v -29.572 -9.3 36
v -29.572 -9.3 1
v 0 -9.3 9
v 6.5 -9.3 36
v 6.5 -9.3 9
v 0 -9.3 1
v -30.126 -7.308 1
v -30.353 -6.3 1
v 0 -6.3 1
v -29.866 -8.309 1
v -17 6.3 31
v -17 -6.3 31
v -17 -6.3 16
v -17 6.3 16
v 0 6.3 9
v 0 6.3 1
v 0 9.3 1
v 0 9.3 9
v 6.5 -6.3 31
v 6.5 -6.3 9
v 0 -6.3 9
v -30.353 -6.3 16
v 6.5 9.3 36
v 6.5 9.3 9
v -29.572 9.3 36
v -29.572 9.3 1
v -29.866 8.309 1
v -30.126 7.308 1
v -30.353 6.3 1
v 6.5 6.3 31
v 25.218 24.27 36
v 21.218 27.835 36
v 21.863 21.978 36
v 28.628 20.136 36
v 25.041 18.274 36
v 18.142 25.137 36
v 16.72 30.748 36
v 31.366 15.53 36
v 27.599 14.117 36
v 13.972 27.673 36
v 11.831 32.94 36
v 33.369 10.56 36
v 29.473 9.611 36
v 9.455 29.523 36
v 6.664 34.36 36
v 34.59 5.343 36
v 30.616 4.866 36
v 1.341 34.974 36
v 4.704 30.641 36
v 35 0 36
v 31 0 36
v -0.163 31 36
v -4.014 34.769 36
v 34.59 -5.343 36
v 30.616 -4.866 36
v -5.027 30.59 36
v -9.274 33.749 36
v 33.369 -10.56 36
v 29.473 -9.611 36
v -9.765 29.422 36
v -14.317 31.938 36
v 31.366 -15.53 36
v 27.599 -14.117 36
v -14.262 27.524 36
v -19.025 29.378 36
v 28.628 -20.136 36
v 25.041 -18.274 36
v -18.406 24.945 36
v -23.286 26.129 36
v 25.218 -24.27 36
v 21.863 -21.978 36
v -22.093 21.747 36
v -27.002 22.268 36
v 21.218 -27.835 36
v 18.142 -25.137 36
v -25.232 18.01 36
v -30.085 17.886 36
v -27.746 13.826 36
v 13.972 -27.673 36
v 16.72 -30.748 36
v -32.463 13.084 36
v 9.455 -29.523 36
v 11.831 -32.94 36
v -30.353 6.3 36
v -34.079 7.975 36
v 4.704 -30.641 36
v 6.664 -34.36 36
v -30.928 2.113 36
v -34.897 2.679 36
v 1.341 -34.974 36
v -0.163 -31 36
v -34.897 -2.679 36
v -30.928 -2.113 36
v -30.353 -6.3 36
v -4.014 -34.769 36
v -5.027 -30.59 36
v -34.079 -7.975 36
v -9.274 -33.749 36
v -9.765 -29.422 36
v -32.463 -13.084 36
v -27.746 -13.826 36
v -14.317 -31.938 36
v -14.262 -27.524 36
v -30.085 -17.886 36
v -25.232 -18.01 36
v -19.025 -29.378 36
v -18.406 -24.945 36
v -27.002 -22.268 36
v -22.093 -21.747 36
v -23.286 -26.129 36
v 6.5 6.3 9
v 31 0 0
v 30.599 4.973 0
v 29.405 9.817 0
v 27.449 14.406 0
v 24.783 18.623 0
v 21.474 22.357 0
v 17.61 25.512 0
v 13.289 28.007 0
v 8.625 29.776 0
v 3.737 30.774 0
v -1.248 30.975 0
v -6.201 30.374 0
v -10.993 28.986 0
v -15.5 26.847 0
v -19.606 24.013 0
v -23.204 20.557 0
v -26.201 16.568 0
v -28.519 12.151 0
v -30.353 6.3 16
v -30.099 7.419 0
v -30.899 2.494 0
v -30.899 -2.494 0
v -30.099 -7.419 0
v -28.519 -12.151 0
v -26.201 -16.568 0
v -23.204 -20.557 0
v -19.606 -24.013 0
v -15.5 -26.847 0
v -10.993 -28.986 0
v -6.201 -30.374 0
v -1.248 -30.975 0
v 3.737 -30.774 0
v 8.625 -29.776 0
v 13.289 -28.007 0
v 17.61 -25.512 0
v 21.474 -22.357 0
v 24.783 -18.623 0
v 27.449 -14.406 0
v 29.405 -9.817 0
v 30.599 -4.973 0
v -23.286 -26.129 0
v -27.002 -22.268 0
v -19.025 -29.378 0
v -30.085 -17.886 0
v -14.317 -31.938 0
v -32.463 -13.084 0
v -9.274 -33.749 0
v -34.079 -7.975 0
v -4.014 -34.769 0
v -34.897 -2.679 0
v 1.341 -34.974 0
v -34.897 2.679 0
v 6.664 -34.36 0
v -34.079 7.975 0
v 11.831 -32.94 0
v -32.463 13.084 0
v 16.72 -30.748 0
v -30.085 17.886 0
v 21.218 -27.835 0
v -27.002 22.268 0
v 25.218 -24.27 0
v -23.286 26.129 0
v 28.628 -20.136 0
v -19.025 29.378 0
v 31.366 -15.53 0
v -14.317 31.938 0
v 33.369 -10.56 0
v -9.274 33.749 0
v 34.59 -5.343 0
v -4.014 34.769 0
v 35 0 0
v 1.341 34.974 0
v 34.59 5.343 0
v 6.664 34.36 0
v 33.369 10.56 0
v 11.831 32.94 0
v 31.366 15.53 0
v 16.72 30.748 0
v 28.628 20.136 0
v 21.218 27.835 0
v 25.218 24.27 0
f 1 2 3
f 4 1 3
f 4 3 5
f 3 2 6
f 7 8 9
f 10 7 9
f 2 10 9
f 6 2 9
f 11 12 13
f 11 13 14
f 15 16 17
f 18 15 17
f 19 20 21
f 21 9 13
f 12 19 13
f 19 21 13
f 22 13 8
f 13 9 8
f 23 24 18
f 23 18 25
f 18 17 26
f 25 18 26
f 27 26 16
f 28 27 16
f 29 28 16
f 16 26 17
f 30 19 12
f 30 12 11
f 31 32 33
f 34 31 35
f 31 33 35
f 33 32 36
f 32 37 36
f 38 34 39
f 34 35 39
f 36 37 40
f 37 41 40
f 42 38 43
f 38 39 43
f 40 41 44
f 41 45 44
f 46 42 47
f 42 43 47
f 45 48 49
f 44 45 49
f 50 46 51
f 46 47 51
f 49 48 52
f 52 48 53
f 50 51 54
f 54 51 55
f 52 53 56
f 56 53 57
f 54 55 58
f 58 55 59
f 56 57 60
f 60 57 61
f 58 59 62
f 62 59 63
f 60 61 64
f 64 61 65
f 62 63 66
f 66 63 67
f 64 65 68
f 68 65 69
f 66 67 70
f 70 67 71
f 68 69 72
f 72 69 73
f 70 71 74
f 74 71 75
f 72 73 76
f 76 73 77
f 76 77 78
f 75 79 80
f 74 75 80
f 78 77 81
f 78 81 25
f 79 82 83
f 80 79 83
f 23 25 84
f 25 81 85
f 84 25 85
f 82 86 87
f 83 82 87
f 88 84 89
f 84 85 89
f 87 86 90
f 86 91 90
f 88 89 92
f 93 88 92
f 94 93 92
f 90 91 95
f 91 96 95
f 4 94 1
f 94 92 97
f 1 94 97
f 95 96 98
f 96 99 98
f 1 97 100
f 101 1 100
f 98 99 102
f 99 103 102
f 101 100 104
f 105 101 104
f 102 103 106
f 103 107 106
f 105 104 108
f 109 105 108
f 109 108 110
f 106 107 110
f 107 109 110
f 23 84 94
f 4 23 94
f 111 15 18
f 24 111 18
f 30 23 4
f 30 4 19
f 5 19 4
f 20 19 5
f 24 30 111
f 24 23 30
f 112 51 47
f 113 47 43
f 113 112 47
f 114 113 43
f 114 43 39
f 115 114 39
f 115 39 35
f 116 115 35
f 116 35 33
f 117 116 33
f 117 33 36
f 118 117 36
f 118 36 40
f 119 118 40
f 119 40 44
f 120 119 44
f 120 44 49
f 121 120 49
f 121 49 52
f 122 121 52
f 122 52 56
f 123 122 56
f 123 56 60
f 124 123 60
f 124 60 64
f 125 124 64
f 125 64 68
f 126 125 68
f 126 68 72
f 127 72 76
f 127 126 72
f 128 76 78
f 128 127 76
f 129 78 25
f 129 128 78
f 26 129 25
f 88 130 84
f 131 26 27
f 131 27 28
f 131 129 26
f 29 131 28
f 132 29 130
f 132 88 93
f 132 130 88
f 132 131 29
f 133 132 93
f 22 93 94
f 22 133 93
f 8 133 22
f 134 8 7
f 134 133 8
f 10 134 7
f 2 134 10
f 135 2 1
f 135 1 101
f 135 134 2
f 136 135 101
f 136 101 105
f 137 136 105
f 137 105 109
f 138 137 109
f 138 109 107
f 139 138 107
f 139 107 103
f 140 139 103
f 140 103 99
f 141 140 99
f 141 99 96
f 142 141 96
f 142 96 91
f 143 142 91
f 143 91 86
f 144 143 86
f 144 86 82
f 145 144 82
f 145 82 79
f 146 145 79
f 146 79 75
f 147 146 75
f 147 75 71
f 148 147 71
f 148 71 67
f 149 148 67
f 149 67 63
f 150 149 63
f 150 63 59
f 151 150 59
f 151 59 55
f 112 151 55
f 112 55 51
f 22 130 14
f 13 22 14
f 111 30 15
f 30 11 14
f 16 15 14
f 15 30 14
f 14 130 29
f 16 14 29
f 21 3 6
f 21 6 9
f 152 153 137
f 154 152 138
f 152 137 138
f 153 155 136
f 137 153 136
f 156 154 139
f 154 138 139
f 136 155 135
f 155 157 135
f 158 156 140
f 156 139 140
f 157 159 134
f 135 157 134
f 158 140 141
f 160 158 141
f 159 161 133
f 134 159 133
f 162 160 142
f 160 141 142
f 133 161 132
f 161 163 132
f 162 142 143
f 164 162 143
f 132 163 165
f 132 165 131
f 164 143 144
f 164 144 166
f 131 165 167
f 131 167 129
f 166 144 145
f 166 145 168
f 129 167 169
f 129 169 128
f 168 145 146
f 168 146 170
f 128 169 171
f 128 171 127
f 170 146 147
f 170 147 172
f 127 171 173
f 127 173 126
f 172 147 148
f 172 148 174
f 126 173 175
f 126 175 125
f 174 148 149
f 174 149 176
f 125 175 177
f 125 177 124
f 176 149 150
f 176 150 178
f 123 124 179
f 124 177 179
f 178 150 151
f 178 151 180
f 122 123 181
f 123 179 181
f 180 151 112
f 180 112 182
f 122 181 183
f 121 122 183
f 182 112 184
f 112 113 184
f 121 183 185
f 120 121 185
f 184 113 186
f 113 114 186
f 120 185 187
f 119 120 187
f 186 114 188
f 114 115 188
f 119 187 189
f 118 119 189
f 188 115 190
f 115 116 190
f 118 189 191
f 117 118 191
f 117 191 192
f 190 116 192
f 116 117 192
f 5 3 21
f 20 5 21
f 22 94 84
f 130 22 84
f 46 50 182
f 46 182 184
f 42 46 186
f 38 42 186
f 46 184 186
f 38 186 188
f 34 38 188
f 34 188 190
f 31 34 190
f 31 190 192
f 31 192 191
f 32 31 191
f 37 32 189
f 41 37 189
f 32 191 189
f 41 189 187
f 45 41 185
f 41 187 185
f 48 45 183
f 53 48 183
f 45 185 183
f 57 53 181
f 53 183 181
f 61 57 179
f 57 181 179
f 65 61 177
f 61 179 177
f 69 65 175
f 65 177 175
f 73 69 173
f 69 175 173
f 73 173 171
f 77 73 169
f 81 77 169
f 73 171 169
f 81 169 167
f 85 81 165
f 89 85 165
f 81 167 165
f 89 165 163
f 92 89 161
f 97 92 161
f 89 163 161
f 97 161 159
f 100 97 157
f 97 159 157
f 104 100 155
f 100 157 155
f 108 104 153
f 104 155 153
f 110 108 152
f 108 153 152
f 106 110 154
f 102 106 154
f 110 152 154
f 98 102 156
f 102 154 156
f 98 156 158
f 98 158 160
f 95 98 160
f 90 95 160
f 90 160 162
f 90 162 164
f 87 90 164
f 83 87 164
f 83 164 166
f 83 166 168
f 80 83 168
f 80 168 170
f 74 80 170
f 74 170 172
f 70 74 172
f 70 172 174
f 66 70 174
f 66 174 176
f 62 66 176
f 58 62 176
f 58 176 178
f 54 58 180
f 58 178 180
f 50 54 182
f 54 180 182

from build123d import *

# Parameters (mm, degrees)
SKETCH1_R           = 35
SKETCH1_R_2         = 31
BOSS_EXTRUDE1_DEPTH = 36
BOSS_EXTRUDE3_START = -27
BOSS_EXTRUDE3_DEPTH = 27
SKETCH7_W           = 13.353088805
SKETCH7_H           = 12.6
BOSS_EXTRUDE4_DEPTH = 20
SKETCH8_W           = 17
SKETCH8_H           = 12.6
BOSS_EXTRUDE5_DEPTH = 5
BOSS_EXTRUDE6_DEPTH = 6.5
BOSS_EXTRUDE2_START = -35
BOSS_EXTRUDE2_DEPTH = 35


# Read off the part's stored shape, not the designer's step: Boss-Extrude6
with BuildPart() as part:
    # Sketch1 → Boss-Extrude1 (new body)
    with BuildSketch(Plane.XY):
        Circle(SKETCH1_R)
        Circle(SKETCH1_R_2, mode=Mode.SUBTRACT)
    extrude(amount=BOSS_EXTRUDE1_DEPTH)

    # Sketch5 → Boss-Extrude3 (add)
    with BuildSketch(Plane.XY.offset(36).offset(BOSS_EXTRUDE3_START)):
        with BuildLine():
            Line((0, 6.3), (0, 9.3))
            Line((0, 9.3), (-29.572115244, 9.3))
            ThreePointArc((-29.572115244, 9.3), (-30.000125334, 7.809768238), (-30.353088805, 6.3))
            Line((-30.353088805, 6.3), (0, 6.3))
        make_face()
        with BuildLine():
            ThreePointArc((-30.353088805, -6.3), (-30.000125334, -7.809768238), (-29.572115244, -9.3))
            Line((-29.572115244, -9.3), (0, -9.3))
            Line((0, -9.3), (0, -6.3))
            Line((0, -6.3), (-30.353088805, -6.3))
        make_face()
    extrude(amount=BOSS_EXTRUDE3_DEPTH)

    # Sketch7 → Boss-Extrude4 (add)
    with BuildSketch(Plane.XY.offset(36)):
        with Locations((-23.676544402, 0)):
            Rectangle(SKETCH7_W, SKETCH7_H)
    extrude(amount=-BOSS_EXTRUDE4_DEPTH)

    # Sketch8 → Boss-Extrude5 (add)
    with BuildSketch(Plane.XY.offset(36)):
        with Locations((-8.5, 0)):
            Rectangle(SKETCH8_W, SKETCH8_H)
    extrude(amount=-BOSS_EXTRUDE5_DEPTH)

    # Boss-Extrude6 outline → Boss-Extrude6 (add)
    with BuildSketch(Plane(origin=(0, 0, 0), x_dir=(0, 0, -1), z_dir=(1, 0, 0))):
        Polygon((-31, 6.3), (-9, 6.3), (-9, 9.3), (-36, 9.3), (-36, -9.3), (-9, -9.3), (-9, -6.3), (-31, -6.3), align=None)
    extrude(amount=BOSS_EXTRUDE6_DEPTH)

    # Sketch2 → Boss-Extrude2 (add)
    with BuildSketch(Plane.XY.offset(36).offset(BOSS_EXTRUDE2_START)):
        with BuildLine():
            Line((0, -6.3), (-30.353088805, -6.3))
            ThreePointArc((-30.353088805, -6.3), (-30.000125334, -7.809768238), (-29.572115244, -9.3))
            Line((-29.572115244, -9.3), (0, -9.3))
            Line((0, -9.3), (0, -6.3))
        make_face()
        with BuildLine():
            Line((-30.353088805, 6.3), (0, 6.3))
            Line((0, 6.3), (0, 9.3))
            Line((0, 9.3), (-29.572115244, 9.3))
            ThreePointArc((-29.572115244, 9.3), (-30.000125334, 7.809768238), (-30.353088805, 6.3))
        make_face()
    extrude(amount=BOSS_EXTRUDE2_DEPTH)


solid = part.part
